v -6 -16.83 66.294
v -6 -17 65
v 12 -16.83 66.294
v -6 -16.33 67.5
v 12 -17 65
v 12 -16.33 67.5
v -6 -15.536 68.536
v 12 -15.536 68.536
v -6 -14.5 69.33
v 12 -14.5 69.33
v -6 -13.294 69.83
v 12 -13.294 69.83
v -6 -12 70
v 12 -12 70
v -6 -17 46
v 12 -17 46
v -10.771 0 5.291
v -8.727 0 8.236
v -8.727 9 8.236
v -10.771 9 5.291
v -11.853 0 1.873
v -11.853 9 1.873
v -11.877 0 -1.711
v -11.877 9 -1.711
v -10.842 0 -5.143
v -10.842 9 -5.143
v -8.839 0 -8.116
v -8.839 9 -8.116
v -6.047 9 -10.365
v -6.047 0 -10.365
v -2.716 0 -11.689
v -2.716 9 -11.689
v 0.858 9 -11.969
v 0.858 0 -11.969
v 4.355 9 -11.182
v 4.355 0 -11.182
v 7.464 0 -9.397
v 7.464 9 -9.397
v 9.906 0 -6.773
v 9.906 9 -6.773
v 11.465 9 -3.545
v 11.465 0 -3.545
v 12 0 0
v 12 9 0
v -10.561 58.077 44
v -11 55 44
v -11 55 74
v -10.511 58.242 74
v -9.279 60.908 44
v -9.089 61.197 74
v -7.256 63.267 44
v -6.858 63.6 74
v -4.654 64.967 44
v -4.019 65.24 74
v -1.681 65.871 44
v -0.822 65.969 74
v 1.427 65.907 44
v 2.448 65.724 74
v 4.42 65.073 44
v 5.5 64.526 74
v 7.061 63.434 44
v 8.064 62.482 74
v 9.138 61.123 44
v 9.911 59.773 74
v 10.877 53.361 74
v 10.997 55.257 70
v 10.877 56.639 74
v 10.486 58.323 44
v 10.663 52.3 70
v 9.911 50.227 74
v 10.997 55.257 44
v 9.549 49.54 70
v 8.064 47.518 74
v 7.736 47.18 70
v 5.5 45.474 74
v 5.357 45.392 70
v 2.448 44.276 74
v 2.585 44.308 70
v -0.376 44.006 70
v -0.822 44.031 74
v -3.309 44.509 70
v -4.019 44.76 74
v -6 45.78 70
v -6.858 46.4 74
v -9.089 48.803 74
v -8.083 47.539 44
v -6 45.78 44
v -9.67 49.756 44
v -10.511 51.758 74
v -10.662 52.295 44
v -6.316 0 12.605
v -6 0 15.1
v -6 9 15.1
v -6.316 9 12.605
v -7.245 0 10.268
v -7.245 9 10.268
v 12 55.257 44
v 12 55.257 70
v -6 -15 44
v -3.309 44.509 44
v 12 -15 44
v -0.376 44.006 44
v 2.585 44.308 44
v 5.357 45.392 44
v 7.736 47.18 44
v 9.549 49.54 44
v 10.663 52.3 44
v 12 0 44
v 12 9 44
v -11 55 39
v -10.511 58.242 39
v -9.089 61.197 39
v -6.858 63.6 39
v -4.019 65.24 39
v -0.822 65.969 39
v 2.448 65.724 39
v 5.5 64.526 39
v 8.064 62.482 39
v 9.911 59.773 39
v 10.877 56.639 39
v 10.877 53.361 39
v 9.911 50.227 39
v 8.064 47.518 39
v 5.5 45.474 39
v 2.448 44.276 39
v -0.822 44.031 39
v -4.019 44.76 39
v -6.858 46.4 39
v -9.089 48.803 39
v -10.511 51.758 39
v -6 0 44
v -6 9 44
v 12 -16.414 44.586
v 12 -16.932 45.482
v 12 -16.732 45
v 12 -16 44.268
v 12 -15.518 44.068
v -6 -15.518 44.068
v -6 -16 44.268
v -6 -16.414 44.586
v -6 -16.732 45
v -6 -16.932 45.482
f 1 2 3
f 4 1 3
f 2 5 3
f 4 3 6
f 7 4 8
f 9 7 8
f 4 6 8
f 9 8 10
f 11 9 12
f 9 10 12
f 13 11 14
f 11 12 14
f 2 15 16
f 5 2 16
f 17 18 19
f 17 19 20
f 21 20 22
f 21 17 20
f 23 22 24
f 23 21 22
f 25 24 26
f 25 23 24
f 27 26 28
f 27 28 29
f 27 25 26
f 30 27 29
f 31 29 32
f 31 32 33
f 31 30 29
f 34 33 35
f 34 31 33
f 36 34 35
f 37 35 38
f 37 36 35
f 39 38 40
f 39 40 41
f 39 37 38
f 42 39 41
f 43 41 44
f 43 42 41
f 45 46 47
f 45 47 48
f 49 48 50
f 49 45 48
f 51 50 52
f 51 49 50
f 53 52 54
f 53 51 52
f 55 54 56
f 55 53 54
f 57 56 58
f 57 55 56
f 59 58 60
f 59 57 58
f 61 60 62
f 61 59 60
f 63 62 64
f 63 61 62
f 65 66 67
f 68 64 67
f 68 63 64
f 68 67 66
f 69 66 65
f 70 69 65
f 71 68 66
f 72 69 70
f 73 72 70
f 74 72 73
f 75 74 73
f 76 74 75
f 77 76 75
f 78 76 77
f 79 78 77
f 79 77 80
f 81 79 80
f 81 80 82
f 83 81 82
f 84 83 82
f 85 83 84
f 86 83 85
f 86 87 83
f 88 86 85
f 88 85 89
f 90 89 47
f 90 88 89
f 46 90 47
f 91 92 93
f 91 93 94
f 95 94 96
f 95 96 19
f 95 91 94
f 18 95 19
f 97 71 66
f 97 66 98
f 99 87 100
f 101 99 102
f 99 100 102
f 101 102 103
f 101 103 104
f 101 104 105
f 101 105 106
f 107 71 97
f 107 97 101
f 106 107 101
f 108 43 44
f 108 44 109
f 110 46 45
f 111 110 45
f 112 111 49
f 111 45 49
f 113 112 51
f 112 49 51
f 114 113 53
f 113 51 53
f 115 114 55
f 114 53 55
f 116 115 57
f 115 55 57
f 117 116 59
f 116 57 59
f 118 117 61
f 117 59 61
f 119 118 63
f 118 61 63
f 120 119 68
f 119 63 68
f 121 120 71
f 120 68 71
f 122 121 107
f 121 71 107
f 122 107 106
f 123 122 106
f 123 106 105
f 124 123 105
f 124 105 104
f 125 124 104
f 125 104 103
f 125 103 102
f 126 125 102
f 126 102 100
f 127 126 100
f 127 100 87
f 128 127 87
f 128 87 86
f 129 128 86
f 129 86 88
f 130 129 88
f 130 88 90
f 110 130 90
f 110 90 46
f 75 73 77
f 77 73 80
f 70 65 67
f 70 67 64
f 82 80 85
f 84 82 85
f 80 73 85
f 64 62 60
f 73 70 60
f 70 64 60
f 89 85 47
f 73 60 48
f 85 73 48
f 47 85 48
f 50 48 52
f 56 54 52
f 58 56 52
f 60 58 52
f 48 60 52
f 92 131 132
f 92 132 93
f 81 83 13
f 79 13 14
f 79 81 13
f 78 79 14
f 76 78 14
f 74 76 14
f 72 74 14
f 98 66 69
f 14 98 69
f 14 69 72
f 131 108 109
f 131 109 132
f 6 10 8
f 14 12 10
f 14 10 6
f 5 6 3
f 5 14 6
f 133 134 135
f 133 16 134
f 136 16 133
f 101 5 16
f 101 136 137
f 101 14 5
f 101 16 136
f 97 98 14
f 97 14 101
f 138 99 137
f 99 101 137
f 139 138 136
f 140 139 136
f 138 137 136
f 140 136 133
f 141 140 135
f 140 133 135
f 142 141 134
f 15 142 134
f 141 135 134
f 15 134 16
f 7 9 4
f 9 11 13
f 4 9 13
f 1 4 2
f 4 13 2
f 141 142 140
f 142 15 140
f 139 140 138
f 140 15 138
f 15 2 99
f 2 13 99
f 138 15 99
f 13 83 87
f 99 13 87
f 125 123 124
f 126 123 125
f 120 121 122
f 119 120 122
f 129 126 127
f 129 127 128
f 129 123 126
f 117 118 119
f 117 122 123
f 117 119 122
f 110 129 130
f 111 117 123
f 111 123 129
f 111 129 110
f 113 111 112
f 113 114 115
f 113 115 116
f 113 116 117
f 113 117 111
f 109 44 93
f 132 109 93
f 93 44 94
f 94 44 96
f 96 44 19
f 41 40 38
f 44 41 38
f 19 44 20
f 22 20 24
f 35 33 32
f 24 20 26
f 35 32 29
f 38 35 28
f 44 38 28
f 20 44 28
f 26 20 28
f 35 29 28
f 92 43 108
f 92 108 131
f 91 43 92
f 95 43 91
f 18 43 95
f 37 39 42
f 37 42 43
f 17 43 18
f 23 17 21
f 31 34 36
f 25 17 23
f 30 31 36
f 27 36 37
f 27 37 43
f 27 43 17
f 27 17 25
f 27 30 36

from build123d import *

# Parameters (mm, degrees)
BOSS_EXTRUDE1_DEPTH      = 9
BOSS_EXTRUDE2_DEPTH      = 46.257033012
BOSS_EXTRUDE2_DEPTH_BACK = 26
SKETCH2_W                = 18
SKETCH2_H                = 26
FILLET2_R                = 2
FILLET3_R                = 5
BOSS_EXTRUDE3_DEPTH      = 5
BOSS_EXTRUDE3_DEPTH_BACK = 30
SKETCH3_R                = 11


with BuildPart() as part:
    # Sketch1 → Boss-Extrude1 (new body)
    with BuildSketch(Plane(origin=(0, 0, 0), x_dir=(1, 0, 0), z_dir=(0, 1, 0))):
        with BuildLine():
            Line((12, 0), (12, -44))
            Line((12, -44), (-6, -44))
            Line((-6, -44), (-6, -15.099668871))
            ThreePointArc((-6, -15.099668871), (-6.706796227, -11.406924141), (-8.727272727, -8.23618302))
            ThreePointArc((-8.727272727, -8.23618302), (-4.431293675, 11.151844527), (12, 0))
        make_face()
    extrude(amount=BOSS_EXTRUDE1_DEPTH)


with BuildPart() as body_2:
    # Sketch2 → Boss-Extrude2 (new, two sides: drawn at the far end of the back side and taken through both)
    with BuildSketch(Plane(origin=(0, 9, 0), x_dir=(1, 0, 0), z_dir=(0, 1, 0)).offset(-BOSS_EXTRUDE2_DEPTH_BACK)):
        with Locations((3, -57)):
            Rectangle(SKETCH2_W, SKETCH2_H)
    extrude(amount=BOSS_EXTRUDE2_DEPTH + BOSS_EXTRUDE2_DEPTH_BACK)

    # Fillet2
    fillet2_edges = [body_2.edges().sort_by_distance(p)[0] for p in [
        (3, -17, 44),
    ]]
    fillet(fillet2_edges, radius=FILLET2_R)

    # Fillet3
    fillet3_edges = [body_2.edges().sort_by_distance(p)[0] for p in [
        (3, -17, 70),
    ]]
    fillet(fillet3_edges, radius=FILLET3_R)

    # Sketch3 → Boss-Extrude3 (add, two sides: drawn at the far end of the back side and taken through both)
    with BuildSketch(Plane(origin=(0, 0, 44), x_dir=(-1, 0, 0), z_dir=(0, 0, -1)).offset(-BOSS_EXTRUDE3_DEPTH_BACK)):
        with Locations((0, 55)):
            Circle(SKETCH3_R)
    extrude(amount=BOSS_EXTRUDE3_DEPTH + BOSS_EXTRUDE3_DEPTH_BACK)


solid = Compound([part.part, body_2.part])
